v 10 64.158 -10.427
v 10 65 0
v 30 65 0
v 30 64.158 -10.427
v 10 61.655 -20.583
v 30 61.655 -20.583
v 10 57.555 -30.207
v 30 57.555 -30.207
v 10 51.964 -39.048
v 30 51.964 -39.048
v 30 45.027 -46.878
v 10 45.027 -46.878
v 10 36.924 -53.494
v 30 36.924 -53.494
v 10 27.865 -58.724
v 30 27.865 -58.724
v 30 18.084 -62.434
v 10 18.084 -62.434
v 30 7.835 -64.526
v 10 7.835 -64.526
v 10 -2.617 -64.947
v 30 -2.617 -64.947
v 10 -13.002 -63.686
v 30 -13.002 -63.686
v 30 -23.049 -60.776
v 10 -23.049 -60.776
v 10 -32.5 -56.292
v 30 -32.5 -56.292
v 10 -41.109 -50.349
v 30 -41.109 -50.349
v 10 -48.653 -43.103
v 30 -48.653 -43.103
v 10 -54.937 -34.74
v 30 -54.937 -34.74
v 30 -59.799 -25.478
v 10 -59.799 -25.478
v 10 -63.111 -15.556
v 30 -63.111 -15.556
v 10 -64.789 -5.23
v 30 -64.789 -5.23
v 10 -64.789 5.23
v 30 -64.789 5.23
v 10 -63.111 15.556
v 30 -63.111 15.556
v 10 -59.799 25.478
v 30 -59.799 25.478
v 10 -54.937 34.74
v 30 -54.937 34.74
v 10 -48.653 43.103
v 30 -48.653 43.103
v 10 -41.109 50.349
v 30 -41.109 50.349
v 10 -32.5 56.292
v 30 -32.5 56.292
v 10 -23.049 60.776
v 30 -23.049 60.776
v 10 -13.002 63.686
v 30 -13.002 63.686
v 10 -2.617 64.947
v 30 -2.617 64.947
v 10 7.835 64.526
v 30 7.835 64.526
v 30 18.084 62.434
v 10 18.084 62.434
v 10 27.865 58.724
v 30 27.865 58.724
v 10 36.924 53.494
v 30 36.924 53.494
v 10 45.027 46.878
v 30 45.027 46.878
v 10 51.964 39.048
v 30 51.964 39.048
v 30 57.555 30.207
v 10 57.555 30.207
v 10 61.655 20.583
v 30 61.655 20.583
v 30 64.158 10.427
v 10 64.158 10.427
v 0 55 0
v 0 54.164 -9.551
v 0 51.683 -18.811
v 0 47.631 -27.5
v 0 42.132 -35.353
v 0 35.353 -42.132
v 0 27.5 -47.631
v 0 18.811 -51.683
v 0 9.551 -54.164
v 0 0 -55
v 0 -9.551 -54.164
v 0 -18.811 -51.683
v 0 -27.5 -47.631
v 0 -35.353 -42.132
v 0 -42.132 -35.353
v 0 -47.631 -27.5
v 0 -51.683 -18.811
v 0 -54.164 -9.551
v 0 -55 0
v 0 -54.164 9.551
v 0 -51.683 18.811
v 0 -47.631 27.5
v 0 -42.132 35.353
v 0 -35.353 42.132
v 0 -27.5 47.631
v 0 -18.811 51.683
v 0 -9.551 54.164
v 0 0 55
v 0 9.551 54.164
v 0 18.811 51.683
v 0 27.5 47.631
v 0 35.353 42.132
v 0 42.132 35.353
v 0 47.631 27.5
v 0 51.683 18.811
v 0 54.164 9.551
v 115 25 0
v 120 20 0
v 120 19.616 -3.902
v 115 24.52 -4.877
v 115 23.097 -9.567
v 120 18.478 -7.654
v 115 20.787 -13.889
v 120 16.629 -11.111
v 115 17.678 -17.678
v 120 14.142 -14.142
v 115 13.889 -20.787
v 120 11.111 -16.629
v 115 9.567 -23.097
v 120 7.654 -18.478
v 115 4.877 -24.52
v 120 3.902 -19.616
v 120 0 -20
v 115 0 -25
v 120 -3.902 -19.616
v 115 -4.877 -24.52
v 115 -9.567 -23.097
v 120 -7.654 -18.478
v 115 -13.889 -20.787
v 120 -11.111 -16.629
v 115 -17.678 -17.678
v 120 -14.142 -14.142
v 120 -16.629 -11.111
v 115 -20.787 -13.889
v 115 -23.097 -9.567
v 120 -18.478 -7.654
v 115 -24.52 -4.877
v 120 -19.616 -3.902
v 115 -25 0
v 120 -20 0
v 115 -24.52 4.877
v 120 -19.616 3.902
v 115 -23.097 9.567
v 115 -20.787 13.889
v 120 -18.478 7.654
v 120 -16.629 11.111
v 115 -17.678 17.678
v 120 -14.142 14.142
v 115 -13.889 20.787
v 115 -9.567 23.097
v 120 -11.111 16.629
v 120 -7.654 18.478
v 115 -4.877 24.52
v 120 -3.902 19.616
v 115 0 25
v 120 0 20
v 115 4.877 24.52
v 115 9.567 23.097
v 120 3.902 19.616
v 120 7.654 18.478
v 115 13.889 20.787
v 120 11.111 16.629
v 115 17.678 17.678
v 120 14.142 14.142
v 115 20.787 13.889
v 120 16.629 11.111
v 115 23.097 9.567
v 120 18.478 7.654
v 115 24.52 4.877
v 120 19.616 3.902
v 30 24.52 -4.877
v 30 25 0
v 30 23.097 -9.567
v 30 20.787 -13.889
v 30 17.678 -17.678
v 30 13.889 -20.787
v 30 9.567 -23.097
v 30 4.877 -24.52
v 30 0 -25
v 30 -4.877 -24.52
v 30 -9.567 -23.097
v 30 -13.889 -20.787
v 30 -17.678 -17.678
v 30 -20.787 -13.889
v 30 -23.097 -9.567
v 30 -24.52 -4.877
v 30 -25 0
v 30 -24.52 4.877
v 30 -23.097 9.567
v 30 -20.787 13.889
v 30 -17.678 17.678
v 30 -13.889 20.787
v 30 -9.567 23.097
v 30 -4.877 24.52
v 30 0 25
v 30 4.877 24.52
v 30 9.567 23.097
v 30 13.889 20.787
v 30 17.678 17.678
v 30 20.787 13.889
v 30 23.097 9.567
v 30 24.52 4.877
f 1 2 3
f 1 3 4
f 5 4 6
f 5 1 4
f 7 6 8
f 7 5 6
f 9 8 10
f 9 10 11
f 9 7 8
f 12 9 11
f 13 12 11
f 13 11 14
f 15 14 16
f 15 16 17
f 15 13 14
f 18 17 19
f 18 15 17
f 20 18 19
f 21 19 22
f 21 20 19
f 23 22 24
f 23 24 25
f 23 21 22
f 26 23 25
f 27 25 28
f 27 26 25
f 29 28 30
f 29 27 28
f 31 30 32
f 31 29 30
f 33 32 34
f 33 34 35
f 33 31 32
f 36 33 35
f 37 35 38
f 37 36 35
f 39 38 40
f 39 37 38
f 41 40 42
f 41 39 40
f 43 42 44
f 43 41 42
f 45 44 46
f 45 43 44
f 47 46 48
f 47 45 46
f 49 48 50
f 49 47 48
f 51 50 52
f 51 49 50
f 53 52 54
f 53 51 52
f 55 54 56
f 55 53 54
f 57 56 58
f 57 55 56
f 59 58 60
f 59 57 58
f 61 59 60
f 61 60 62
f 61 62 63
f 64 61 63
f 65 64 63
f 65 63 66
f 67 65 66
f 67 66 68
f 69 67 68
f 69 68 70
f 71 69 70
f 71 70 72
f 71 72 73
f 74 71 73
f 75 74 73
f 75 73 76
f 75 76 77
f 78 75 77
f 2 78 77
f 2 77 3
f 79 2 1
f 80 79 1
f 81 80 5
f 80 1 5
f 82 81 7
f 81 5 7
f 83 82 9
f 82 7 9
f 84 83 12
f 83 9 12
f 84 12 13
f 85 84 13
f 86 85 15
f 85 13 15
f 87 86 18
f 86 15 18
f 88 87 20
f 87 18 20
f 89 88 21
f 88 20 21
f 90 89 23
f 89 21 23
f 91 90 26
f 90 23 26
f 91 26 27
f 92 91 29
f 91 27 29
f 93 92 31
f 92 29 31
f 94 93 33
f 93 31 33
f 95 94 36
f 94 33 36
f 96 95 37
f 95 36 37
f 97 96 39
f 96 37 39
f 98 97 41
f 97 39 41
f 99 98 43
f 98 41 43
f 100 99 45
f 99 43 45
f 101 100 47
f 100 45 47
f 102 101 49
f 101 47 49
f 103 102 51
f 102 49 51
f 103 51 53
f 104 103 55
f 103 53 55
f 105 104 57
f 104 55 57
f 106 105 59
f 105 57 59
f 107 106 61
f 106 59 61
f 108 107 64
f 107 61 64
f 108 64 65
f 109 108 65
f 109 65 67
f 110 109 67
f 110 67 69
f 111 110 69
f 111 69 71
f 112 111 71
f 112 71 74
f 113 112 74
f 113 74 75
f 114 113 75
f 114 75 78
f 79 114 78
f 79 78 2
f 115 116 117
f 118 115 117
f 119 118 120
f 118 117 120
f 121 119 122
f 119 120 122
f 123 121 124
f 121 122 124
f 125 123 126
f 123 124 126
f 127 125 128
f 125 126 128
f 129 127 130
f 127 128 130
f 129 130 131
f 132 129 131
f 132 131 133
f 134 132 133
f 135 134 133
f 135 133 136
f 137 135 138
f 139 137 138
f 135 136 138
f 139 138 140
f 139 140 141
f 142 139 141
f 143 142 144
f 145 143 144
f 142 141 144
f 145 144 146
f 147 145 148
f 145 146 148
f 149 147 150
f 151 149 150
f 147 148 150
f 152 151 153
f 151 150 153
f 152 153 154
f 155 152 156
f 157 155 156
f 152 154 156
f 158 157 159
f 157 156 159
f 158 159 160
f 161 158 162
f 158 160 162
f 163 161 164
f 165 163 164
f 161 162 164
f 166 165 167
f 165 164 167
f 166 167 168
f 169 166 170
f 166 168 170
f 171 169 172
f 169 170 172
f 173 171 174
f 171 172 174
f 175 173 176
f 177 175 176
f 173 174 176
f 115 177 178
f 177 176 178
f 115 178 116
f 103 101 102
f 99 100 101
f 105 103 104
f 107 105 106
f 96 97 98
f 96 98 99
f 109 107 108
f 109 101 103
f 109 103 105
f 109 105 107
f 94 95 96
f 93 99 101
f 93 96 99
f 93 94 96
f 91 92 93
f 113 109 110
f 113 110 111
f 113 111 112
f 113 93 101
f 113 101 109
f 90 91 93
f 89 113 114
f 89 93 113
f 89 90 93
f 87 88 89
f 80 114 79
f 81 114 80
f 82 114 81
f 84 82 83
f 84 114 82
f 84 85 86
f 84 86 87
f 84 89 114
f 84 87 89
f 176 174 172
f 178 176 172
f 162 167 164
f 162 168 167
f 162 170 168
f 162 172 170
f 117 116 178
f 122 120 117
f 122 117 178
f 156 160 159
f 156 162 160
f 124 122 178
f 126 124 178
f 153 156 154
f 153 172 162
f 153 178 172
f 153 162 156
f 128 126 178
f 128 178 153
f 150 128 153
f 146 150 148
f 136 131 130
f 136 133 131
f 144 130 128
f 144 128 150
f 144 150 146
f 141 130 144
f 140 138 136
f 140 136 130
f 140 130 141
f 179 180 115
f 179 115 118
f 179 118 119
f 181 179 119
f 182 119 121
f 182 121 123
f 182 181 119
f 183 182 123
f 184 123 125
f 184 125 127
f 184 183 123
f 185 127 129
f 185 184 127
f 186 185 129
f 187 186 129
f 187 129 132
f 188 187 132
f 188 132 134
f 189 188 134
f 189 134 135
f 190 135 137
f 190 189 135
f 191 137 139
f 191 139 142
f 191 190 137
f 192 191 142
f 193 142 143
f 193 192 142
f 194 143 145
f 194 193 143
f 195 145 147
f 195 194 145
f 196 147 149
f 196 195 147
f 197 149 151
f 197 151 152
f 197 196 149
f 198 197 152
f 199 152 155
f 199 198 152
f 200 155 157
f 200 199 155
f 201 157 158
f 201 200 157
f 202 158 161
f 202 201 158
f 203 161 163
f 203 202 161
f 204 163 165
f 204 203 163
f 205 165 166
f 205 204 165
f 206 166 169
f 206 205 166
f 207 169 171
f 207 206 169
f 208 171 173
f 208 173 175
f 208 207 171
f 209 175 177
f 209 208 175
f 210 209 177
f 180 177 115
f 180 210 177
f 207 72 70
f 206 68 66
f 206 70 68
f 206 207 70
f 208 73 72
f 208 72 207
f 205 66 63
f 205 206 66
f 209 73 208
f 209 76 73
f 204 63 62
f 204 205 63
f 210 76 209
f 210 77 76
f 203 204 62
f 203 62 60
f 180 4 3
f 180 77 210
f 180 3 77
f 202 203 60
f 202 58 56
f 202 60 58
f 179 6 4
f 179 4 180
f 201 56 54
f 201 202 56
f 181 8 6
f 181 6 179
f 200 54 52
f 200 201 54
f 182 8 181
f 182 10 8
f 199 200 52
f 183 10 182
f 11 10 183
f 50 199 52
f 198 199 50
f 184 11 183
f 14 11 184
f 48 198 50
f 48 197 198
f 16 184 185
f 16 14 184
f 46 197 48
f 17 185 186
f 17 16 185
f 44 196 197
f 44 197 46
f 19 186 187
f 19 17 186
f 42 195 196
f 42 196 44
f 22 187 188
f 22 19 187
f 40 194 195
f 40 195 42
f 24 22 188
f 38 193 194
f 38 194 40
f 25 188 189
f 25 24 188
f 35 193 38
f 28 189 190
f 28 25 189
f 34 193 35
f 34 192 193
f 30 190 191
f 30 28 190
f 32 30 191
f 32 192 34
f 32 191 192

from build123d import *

# Parameters (mm, degrees)
F2_SIZE2 = 10
F2_SIZE  = 10
F3_SIZE  = 5


with BuildPart() as f1:
    # F0 (on Top) → F1 (revolve)
    with BuildSketch(Plane.XY):
        Polygon((0, 65), (0, 0), (120, 0), (120, 25), (102, 25), (30, 25), (30, 65), align=None)
    revolve(axis=Axis((60, 0, 0), (-1, 0, 0)))

    # F2
    f2_edges = [f1.edges().sort_by_distance(p)[0] for p in [
        (0, -65, 0),
    ]]
    chamfer(f2_edges, length=F2_SIZE, length2=F2_SIZE2)

    # F3
    f3_edges = [f1.edges().sort_by_distance(p)[0] for p in [
        (120, -25, 0),
    ]]
    chamfer(f3_edges, length=F3_SIZE)


solid = f1.part
